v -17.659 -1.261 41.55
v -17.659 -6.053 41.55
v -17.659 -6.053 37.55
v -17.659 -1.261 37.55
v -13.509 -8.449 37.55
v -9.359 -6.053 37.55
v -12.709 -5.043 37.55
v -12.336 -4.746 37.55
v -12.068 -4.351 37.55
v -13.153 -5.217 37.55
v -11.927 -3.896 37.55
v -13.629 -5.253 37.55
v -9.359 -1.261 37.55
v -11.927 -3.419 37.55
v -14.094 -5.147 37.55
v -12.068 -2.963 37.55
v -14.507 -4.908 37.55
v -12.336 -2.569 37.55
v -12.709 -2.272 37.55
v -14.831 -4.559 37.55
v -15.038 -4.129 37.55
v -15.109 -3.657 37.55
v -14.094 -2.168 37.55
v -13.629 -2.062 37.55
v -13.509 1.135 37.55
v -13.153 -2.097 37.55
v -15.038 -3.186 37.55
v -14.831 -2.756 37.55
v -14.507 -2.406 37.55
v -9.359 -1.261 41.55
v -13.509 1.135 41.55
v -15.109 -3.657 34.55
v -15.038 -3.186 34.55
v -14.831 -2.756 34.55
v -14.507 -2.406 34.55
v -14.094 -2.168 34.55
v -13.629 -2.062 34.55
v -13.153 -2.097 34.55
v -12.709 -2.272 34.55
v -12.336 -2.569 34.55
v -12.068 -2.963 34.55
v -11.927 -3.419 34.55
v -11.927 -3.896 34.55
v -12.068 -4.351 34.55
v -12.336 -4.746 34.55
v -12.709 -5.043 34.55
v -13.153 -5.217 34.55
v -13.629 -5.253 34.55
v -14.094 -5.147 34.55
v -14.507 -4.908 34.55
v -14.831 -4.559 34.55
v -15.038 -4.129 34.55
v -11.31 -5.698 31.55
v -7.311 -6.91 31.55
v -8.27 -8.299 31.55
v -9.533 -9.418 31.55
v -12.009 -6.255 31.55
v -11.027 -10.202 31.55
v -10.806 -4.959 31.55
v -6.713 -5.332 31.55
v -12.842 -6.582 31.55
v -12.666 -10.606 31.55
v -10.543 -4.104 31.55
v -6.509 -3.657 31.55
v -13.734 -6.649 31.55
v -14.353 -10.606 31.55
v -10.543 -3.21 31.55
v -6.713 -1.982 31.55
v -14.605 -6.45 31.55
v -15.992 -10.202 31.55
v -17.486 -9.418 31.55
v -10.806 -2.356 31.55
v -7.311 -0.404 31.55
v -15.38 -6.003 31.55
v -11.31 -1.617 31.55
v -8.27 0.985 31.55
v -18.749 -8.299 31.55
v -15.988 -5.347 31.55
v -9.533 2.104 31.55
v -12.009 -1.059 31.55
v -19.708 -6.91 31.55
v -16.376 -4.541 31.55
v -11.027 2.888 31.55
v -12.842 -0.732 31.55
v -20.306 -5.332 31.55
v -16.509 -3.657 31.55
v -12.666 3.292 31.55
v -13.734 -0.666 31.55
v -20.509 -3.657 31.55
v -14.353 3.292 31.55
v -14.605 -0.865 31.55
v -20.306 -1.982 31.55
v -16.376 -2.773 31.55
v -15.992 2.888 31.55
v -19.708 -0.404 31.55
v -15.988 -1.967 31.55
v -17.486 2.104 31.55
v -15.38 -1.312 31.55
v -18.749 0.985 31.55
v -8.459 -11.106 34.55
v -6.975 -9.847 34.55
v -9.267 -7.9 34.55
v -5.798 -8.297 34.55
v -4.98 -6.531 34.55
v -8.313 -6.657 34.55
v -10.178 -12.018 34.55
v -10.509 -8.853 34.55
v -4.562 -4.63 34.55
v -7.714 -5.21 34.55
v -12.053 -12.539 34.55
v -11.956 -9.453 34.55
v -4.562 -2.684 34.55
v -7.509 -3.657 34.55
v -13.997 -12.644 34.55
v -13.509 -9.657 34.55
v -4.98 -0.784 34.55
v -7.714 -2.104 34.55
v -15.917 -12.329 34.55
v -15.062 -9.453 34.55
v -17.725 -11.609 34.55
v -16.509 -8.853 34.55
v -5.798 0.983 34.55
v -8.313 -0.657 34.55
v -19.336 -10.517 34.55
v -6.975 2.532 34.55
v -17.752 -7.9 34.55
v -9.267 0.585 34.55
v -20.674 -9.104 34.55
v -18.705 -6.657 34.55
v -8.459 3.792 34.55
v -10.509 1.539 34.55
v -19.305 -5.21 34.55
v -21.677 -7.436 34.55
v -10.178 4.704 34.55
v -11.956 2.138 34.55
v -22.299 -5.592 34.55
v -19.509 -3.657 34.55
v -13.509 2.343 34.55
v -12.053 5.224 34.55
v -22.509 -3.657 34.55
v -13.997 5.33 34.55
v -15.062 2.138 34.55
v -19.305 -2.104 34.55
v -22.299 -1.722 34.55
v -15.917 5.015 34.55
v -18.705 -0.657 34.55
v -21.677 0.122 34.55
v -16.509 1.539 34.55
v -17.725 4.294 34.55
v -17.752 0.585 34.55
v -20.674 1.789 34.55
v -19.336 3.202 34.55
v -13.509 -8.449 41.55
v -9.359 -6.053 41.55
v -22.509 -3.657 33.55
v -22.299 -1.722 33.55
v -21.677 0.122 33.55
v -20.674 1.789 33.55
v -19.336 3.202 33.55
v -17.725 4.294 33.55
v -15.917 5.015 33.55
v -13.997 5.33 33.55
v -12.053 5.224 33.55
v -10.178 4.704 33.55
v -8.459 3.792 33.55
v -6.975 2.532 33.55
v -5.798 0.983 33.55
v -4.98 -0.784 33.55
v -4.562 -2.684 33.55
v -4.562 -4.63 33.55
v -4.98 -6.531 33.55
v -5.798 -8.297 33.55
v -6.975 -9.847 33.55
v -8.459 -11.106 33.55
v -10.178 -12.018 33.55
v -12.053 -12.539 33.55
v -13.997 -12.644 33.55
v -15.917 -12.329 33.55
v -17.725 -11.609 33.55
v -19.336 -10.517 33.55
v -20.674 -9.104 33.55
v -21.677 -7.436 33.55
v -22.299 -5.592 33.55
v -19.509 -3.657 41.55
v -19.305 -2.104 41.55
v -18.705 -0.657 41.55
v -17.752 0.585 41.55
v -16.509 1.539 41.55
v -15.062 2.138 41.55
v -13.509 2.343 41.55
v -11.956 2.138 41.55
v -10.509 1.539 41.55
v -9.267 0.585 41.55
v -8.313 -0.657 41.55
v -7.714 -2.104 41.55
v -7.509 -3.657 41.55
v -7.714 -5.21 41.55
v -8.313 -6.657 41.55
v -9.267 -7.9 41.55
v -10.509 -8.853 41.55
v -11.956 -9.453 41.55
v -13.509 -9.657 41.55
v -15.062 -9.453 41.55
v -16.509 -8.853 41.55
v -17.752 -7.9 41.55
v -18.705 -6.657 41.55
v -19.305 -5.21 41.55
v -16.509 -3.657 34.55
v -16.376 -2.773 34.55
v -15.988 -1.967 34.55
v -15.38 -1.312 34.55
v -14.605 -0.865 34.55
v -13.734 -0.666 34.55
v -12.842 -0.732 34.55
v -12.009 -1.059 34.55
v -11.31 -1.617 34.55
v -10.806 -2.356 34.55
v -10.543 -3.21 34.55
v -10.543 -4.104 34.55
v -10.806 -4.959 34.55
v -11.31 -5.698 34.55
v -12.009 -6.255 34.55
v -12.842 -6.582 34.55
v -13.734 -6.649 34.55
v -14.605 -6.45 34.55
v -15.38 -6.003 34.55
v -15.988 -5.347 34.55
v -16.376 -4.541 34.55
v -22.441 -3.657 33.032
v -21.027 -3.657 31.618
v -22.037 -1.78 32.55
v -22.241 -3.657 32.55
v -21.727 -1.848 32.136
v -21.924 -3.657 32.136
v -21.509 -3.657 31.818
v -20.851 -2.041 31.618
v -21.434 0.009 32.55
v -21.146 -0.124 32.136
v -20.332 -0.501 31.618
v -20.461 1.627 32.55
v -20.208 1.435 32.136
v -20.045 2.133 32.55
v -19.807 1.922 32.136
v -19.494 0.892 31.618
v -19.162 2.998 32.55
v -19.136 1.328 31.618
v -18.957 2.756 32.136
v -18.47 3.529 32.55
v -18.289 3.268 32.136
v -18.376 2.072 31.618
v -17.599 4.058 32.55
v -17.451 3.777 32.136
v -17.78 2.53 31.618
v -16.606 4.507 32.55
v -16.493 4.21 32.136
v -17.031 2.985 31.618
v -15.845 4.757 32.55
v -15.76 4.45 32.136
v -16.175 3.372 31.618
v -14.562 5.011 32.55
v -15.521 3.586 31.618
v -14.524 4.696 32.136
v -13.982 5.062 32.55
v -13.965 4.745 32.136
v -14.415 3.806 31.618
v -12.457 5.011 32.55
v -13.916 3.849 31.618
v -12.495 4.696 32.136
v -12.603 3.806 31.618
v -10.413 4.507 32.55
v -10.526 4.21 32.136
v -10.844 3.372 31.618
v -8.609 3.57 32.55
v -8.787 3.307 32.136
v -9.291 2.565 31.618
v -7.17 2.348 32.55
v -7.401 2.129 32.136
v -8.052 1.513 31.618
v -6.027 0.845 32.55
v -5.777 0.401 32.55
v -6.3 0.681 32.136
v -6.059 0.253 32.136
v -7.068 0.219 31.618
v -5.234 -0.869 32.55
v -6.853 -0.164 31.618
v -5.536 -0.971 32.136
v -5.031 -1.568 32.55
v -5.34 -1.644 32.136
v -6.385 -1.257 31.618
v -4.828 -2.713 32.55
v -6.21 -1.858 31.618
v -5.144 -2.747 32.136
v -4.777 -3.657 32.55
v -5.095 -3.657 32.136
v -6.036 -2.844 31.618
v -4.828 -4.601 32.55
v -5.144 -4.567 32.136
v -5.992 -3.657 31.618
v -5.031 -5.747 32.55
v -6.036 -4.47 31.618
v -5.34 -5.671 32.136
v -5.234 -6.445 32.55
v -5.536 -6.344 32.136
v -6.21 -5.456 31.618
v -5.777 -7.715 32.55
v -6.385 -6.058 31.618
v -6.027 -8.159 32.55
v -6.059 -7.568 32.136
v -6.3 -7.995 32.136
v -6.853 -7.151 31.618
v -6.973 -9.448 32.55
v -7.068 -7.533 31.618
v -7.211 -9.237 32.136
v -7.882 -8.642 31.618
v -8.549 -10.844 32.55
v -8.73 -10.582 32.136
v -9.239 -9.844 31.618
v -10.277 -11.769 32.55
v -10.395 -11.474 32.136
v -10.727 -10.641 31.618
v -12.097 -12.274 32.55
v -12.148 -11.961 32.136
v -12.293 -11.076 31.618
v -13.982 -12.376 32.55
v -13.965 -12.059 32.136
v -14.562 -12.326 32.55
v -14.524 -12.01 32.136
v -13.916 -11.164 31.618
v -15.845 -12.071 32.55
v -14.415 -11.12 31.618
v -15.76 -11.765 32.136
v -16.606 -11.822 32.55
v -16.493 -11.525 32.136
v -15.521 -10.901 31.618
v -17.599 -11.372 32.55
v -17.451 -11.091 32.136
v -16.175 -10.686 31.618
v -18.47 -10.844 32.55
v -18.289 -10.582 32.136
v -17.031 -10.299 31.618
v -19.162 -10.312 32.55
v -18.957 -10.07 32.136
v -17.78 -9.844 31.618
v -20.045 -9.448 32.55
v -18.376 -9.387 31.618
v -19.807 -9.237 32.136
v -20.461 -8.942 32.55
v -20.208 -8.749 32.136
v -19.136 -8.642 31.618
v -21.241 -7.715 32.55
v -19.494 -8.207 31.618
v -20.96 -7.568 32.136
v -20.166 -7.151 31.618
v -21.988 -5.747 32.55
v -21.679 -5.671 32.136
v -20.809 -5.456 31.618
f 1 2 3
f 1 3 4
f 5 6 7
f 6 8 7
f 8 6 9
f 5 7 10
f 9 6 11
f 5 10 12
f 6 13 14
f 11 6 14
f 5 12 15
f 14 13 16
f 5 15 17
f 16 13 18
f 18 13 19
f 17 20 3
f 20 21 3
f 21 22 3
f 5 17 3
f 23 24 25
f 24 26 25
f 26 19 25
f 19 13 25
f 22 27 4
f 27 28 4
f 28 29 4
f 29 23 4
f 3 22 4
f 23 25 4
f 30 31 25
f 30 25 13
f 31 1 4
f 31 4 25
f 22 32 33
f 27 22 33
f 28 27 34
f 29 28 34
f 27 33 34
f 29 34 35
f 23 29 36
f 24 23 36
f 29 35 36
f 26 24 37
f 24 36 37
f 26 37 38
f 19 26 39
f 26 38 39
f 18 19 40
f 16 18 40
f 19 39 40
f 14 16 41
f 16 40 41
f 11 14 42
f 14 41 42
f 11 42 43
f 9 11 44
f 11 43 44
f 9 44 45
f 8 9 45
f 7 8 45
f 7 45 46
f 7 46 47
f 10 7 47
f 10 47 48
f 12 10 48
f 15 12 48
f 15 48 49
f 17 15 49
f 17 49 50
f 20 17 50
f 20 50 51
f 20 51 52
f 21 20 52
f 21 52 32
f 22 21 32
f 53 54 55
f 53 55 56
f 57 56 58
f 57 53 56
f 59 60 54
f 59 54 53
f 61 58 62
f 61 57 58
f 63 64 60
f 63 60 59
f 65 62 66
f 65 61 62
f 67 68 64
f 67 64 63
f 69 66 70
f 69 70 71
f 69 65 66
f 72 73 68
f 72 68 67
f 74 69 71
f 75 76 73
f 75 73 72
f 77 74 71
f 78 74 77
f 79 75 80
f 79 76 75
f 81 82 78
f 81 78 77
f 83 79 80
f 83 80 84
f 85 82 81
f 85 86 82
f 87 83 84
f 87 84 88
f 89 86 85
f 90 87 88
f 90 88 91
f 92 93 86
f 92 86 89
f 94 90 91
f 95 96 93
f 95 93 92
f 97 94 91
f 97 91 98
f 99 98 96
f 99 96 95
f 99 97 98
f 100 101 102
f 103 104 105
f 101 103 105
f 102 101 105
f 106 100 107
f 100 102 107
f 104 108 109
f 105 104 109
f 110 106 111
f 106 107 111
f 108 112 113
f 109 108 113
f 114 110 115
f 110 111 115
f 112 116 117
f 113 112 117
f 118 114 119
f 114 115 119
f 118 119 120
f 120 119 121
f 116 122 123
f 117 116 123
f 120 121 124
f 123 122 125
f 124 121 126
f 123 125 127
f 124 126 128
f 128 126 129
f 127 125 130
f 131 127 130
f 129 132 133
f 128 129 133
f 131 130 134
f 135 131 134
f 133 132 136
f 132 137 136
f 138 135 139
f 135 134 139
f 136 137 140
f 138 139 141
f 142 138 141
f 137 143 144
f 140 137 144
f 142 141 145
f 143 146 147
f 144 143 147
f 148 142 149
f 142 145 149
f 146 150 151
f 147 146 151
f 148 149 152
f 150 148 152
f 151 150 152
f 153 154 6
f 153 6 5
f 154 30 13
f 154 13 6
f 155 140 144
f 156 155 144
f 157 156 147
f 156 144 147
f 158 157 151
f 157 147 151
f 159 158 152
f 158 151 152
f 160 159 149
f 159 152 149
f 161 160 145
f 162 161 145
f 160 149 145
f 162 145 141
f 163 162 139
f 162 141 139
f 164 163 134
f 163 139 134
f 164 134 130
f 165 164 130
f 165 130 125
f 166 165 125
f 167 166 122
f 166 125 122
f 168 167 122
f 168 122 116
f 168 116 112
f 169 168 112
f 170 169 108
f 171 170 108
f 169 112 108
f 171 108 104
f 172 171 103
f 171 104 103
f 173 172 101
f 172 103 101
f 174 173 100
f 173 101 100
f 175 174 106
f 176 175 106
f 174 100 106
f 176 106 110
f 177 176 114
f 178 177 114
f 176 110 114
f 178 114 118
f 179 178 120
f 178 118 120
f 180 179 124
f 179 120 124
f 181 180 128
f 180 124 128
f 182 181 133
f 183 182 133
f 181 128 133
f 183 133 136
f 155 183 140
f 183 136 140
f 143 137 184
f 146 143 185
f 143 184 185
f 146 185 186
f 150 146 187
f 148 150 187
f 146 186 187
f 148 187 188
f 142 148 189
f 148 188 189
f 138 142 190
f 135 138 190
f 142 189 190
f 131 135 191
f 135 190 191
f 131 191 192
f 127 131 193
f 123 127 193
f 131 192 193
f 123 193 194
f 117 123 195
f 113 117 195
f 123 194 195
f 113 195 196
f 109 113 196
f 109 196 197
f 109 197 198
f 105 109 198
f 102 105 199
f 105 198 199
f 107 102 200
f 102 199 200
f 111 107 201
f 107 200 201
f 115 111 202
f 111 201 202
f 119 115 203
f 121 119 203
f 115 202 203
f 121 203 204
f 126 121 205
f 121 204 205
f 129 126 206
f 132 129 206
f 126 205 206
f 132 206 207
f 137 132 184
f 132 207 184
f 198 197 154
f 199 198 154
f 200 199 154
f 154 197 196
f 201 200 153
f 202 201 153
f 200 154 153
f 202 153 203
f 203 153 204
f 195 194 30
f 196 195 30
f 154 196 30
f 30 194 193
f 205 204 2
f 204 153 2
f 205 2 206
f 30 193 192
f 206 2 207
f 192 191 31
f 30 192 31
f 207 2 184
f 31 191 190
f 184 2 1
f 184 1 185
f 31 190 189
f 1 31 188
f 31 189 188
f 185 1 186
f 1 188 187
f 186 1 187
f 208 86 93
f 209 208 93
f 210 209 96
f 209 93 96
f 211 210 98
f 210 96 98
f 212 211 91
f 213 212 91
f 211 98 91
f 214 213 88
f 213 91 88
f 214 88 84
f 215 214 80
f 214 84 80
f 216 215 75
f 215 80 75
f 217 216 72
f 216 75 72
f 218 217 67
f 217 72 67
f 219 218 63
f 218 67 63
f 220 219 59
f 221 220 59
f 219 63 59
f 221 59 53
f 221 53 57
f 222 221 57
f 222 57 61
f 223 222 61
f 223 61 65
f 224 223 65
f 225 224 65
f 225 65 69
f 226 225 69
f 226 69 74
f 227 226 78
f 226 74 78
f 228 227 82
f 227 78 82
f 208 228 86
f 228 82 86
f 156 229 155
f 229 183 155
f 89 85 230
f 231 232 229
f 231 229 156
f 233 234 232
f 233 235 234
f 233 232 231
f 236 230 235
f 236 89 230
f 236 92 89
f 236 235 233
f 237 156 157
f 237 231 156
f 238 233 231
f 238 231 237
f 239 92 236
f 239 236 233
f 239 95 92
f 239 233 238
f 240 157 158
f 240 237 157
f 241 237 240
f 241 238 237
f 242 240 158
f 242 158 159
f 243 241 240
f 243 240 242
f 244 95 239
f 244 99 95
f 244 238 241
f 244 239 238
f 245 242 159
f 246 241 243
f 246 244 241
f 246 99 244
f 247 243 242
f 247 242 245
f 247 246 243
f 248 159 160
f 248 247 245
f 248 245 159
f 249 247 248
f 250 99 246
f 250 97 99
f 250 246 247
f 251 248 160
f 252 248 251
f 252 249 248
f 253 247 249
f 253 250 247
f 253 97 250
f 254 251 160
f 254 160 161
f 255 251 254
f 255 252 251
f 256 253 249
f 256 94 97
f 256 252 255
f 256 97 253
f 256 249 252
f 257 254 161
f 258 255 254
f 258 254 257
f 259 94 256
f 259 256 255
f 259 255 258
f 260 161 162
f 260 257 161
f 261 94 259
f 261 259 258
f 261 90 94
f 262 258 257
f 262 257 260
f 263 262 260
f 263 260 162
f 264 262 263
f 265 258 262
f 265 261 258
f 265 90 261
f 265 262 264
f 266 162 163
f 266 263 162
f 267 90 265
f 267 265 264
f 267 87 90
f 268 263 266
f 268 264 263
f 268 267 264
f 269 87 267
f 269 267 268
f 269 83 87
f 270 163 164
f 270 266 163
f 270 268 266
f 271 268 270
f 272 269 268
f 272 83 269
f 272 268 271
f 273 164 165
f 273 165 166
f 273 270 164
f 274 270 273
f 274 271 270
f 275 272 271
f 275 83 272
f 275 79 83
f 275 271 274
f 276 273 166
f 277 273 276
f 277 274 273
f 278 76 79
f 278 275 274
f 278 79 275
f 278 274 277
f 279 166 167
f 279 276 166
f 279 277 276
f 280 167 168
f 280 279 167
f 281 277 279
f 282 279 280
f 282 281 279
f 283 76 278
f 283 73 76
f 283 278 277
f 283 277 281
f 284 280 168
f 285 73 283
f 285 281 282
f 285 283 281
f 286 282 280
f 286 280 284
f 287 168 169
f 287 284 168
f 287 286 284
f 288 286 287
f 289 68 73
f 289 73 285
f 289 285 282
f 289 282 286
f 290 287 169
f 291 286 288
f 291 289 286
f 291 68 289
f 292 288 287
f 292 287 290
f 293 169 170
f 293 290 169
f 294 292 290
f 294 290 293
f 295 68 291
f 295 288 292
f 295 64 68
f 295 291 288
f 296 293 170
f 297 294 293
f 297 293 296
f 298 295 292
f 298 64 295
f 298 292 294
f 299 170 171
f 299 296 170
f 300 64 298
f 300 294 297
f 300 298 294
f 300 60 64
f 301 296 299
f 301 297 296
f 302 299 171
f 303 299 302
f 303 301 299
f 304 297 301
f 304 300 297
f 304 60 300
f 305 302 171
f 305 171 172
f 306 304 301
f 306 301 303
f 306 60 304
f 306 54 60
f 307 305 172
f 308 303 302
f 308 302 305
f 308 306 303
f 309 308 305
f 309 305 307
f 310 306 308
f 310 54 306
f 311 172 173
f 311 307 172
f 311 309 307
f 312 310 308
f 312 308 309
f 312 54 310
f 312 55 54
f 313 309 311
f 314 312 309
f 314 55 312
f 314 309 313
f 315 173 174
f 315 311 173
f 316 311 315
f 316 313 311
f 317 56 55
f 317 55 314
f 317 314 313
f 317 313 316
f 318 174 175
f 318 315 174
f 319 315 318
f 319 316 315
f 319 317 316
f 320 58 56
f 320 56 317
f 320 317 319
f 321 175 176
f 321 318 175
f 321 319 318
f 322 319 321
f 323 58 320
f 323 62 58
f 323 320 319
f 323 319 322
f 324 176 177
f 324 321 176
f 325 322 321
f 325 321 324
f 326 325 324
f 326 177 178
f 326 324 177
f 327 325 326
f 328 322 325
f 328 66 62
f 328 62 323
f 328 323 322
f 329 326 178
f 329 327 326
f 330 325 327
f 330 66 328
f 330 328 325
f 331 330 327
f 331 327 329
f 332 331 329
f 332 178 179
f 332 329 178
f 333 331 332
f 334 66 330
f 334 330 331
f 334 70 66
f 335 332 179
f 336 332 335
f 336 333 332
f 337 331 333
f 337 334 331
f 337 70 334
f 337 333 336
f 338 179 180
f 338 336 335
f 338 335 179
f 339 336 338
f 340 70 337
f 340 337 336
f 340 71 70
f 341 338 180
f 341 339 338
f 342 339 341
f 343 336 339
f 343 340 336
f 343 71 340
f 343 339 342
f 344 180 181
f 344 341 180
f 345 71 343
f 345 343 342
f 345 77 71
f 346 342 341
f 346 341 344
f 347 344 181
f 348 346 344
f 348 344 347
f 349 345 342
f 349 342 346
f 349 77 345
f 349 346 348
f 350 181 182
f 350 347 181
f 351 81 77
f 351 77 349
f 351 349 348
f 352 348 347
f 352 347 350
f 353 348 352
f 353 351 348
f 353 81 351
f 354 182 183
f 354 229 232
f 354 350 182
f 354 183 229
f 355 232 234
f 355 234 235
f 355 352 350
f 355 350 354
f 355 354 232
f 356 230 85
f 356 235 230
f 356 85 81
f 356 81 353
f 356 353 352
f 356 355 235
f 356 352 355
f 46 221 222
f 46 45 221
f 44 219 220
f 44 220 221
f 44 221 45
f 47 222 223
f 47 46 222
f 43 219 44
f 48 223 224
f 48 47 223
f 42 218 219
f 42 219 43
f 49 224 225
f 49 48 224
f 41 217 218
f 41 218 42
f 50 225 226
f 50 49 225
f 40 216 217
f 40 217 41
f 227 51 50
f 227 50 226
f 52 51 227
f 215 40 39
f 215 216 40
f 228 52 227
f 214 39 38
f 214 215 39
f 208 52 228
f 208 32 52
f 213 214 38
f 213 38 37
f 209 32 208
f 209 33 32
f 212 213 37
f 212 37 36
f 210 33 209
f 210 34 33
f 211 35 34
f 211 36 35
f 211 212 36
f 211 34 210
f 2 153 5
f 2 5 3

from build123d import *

# Parameters (mm, degrees)
SALIENTE_EXTRUIR1_START = -7
CROQUIS1_R              = 6
SALIENTE_EXTRUIR1_DEPTH = 4
CROQUIS2_R              = 6
SALIENTE_EXTRUIR2_DEPTH = 3
CROQUIS3_R              = 9
SALIENTE_EXTRUIR3_DEPTH = 3
CROQUIS4_R              = 1.6
CORTAR_EXTRUIR1_DEPTH   = 11.5
CROQUIS5_R              = 3
CORTAR_EXTRUIR2_DEPTH   = 3
REDONDEO1_R             = 2


with BuildPart() as part:
    # Croquis1 → Saliente-Extruir1 (new body)
    with BuildSketch(Plane(origin=(0, 0, 34.55), x_dir=(-1, 0, 0), z_dir=(0, 0, -1)).offset(SALIENTE_EXTRUIR1_START)):
        with Locations((13.509321031, -3.657231325)):
            Circle(CROQUIS1_R)
        Polygon((9.359321031, -1.261227707), (9.359321031, -6.053234942), (13.509321031, -8.449238559), (17.659321031, -6.053234942), (17.659321031, -1.261227707), (13.509321031, 1.13477591), align=None, mode=Mode.SUBTRACT)
    extrude(amount=SALIENTE_EXTRUIR1_DEPTH)

    # Croquis2 → Saliente-Extruir2 (add)
    with BuildSketch(Plane(origin=(0, 0, 37.55), x_dir=(-1, 0, 0), z_dir=(0, 0, -1))):
        with Locations((13.509321031, -3.657231325)):
            Circle(CROQUIS2_R)
    extrude(amount=SALIENTE_EXTRUIR2_DEPTH)

    # Croquis3 → Saliente-Extruir3 (add)
    with BuildSketch(Plane(origin=(0, 0, 34.55), x_dir=(-1, 0, 0), z_dir=(0, 0, -1))):
        with Locations((13.509321031, -3.657231325)):
            Circle(CROQUIS3_R)
    extrude(amount=SALIENTE_EXTRUIR3_DEPTH)

    # Croquis4 → Cortar-Extruir1 (cut)
    with BuildSketch(Plane(origin=(0, 0, 31.55), x_dir=(-1, 0, 0), z_dir=(0, 0, -1))):
        with Locations((13.509321031, -3.657231325)):
            Circle(CROQUIS4_R)
    extrude(amount=-CORTAR_EXTRUIR1_DEPTH, mode=Mode.SUBTRACT)

    # Croquis5 → Cortar-Extruir2 (cut)
    with BuildSketch(Plane(origin=(0, 0, 31.55), x_dir=(-1, 0, 0), z_dir=(0, 0, -1))):
        with Locations((13.509321031, -3.657231325)):
            Circle(CROQUIS5_R)
    extrude(amount=-CORTAR_EXTRUIR2_DEPTH, mode=Mode.SUBTRACT)

    # Redondeo1
    redondeo1_edges = [part.edges().sort_by_distance(p)[0] for p in [
        (-4.509321031, -3.657231325, 31.55),
    ]]
    fillet(redondeo1_edges, radius=REDONDEO1_R)


solid = part.part
